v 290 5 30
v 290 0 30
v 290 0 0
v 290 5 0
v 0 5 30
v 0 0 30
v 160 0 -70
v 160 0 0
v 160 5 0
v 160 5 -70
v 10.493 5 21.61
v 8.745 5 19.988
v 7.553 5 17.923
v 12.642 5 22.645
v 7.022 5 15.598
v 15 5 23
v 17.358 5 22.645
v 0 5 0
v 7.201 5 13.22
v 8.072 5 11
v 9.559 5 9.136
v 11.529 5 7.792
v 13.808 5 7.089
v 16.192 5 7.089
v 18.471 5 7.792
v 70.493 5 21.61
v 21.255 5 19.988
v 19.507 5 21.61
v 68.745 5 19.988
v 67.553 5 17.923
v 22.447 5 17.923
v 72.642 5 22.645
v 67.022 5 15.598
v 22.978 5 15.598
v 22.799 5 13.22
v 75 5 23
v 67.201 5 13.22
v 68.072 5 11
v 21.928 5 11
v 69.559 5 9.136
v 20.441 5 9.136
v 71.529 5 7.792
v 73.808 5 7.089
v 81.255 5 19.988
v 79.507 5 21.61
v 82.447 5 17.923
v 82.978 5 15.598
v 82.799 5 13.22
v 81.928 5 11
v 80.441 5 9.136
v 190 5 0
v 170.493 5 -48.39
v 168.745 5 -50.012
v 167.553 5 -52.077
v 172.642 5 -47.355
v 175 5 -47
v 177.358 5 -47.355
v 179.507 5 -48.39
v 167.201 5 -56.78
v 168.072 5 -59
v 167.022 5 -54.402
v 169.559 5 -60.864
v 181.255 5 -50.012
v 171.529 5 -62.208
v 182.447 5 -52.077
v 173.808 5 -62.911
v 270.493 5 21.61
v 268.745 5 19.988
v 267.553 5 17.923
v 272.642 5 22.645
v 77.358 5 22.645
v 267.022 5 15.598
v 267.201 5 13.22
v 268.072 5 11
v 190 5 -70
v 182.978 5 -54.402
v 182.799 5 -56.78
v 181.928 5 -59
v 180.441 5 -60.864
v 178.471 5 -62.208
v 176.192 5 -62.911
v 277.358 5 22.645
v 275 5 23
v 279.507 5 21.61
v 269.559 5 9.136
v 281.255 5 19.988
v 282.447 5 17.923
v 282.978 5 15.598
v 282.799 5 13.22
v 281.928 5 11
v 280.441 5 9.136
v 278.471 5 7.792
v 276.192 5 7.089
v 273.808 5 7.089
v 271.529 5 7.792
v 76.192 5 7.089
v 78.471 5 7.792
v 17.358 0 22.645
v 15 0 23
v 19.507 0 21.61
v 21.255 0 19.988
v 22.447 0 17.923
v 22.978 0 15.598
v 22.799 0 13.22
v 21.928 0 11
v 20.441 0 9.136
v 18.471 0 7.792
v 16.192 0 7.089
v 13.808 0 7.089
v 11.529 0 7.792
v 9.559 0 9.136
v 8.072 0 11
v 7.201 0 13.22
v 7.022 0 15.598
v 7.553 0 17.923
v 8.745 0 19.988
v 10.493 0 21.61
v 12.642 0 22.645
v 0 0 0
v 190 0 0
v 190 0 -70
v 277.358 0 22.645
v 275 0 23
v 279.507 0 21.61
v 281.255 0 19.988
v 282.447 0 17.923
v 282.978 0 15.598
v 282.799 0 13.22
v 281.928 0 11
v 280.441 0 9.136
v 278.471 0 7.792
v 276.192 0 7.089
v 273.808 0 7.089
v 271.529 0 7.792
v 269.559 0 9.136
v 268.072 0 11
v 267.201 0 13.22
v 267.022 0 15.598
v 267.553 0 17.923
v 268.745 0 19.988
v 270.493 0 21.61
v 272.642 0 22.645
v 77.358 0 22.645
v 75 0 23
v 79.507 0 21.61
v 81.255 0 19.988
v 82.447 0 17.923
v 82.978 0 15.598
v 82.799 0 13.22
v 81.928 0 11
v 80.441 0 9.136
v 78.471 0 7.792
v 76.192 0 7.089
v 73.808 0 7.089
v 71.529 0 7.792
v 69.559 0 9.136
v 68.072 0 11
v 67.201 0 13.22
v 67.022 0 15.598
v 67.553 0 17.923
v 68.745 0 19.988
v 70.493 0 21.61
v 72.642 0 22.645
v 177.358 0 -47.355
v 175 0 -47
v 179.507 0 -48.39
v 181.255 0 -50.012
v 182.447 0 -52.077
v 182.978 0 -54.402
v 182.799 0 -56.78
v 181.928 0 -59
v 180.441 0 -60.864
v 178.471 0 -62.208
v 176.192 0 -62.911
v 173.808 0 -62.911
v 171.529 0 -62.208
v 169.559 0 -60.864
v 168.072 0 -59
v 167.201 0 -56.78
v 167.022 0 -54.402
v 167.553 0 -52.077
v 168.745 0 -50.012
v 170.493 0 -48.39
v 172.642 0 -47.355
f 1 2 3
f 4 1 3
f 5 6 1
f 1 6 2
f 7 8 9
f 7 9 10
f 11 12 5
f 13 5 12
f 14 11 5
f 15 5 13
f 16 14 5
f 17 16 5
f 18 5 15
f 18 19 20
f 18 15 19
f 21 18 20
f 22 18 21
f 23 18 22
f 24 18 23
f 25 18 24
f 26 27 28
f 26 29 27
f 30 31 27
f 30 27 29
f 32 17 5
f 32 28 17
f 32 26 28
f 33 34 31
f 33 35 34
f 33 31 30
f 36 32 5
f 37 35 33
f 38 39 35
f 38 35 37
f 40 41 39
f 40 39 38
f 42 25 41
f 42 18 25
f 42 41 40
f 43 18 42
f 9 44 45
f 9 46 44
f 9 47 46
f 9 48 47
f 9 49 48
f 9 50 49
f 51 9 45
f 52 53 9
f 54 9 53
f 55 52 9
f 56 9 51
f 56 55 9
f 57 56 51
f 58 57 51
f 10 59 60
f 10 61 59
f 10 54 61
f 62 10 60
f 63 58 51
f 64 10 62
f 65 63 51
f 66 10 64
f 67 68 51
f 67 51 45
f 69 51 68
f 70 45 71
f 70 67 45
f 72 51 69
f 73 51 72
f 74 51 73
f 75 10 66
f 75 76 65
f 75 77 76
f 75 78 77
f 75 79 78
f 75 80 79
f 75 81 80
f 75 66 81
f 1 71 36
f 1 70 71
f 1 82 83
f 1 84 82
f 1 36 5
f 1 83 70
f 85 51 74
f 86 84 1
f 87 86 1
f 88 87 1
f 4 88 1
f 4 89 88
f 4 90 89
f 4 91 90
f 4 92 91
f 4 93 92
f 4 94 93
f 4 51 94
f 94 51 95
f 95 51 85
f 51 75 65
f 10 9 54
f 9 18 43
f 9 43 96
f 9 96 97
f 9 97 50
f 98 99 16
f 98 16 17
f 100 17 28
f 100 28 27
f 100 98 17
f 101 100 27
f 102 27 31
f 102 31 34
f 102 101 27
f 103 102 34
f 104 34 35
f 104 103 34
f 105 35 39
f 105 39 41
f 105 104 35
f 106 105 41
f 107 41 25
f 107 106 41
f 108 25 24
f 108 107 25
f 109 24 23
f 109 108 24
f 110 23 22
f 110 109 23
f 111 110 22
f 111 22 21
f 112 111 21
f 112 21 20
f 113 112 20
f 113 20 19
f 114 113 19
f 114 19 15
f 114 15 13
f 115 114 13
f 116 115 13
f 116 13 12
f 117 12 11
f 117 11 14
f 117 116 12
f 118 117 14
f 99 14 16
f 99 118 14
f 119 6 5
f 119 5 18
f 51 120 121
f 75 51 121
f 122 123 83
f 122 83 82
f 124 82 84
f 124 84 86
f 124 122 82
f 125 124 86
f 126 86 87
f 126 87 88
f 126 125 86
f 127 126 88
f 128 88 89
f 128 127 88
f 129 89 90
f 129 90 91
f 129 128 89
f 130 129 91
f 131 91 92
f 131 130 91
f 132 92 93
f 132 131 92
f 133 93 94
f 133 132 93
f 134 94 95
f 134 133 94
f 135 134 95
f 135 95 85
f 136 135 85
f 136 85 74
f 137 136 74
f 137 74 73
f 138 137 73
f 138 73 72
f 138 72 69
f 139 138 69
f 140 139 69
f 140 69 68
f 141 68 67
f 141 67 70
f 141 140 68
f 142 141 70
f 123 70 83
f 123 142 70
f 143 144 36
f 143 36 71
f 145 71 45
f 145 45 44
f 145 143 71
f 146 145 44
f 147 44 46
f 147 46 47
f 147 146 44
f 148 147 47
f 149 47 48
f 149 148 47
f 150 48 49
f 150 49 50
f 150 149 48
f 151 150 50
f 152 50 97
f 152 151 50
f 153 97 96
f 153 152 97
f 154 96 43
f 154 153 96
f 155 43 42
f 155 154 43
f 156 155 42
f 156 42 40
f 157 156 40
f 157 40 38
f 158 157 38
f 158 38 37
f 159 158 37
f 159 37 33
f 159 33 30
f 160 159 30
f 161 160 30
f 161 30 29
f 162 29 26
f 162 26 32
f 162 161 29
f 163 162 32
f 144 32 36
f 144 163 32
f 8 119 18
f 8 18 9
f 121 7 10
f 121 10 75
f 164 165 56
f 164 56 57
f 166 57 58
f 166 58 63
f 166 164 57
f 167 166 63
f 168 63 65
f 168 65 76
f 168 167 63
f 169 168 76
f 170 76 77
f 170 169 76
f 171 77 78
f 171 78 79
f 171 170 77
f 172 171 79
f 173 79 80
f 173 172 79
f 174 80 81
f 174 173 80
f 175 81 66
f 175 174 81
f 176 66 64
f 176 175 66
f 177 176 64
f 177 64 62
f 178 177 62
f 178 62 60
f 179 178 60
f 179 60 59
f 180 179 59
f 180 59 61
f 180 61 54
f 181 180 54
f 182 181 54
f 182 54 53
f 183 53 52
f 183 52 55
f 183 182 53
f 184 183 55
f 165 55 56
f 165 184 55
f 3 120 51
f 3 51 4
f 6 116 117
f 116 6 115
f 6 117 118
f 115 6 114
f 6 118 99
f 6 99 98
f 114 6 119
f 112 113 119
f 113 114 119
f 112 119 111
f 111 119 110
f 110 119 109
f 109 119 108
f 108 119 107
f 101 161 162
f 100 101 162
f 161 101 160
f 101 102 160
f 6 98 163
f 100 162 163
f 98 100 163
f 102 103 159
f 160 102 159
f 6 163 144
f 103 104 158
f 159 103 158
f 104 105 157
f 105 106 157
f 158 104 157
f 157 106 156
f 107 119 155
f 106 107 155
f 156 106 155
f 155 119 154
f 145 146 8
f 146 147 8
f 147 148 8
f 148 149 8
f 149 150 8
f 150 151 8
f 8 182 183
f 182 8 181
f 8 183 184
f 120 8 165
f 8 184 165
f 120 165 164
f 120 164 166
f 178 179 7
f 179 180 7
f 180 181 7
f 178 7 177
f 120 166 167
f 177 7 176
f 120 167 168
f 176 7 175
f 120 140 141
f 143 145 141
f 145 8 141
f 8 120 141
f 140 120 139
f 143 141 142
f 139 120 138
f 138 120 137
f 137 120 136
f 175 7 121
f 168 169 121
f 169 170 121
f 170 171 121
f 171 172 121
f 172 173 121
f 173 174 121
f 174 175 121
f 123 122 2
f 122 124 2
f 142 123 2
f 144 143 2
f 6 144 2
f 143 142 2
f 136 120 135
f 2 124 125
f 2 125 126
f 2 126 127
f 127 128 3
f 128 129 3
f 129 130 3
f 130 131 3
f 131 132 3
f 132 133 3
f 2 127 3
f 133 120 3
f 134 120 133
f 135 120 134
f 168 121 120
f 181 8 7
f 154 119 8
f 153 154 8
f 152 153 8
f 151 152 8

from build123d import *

# Parameters (mm, degrees)
SKETCH2_W           = 290
SKETCH2_H           = 30
SKETCH2_R           = 8
SKETCH2_W_2         = 30
SKETCH2_H_2         = 90
BOSS_EXTRUDE5_DEPTH = 5


with BuildPart() as part:
    # Sketch2 → Boss-Extrude5 (new body)
    # profile 1 of 2: a face of its own
    with BuildSketch(Plane(origin=(0, 0, 0), x_dir=(1, 0, 0), z_dir=(0, 1, 0))):
        with Locations((145, -15)):
            Rectangle(SKETCH2_W, SKETCH2_H)
        with Locations(Location((15, -15, 0), (0, 0, 270))):
            Circle(SKETCH2_R, mode=Mode.SUBTRACT)
        with Locations(Location((275, -15, 0), (0, 0, 270))):
            Circle(SKETCH2_R, mode=Mode.SUBTRACT)
        with Locations(Location((75, -15, 0), (0, 0, 270))):
            Circle(SKETCH2_R, mode=Mode.SUBTRACT)
    # profile 2 of 2: a face of its own
    with BuildSketch(Plane(origin=(0, 0, 0), x_dir=(1, 0, 0), z_dir=(0, 1, 0))):
        with Locations((175, 25)):
            Rectangle(SKETCH2_W_2, SKETCH2_H_2)
        with Locations(Location((175, 55, 0), (0, 0, 270))):
            Circle(SKETCH2_R, mode=Mode.SUBTRACT)
    extrude(amount=BOSS_EXTRUDE5_DEPTH)


solid = part.part
